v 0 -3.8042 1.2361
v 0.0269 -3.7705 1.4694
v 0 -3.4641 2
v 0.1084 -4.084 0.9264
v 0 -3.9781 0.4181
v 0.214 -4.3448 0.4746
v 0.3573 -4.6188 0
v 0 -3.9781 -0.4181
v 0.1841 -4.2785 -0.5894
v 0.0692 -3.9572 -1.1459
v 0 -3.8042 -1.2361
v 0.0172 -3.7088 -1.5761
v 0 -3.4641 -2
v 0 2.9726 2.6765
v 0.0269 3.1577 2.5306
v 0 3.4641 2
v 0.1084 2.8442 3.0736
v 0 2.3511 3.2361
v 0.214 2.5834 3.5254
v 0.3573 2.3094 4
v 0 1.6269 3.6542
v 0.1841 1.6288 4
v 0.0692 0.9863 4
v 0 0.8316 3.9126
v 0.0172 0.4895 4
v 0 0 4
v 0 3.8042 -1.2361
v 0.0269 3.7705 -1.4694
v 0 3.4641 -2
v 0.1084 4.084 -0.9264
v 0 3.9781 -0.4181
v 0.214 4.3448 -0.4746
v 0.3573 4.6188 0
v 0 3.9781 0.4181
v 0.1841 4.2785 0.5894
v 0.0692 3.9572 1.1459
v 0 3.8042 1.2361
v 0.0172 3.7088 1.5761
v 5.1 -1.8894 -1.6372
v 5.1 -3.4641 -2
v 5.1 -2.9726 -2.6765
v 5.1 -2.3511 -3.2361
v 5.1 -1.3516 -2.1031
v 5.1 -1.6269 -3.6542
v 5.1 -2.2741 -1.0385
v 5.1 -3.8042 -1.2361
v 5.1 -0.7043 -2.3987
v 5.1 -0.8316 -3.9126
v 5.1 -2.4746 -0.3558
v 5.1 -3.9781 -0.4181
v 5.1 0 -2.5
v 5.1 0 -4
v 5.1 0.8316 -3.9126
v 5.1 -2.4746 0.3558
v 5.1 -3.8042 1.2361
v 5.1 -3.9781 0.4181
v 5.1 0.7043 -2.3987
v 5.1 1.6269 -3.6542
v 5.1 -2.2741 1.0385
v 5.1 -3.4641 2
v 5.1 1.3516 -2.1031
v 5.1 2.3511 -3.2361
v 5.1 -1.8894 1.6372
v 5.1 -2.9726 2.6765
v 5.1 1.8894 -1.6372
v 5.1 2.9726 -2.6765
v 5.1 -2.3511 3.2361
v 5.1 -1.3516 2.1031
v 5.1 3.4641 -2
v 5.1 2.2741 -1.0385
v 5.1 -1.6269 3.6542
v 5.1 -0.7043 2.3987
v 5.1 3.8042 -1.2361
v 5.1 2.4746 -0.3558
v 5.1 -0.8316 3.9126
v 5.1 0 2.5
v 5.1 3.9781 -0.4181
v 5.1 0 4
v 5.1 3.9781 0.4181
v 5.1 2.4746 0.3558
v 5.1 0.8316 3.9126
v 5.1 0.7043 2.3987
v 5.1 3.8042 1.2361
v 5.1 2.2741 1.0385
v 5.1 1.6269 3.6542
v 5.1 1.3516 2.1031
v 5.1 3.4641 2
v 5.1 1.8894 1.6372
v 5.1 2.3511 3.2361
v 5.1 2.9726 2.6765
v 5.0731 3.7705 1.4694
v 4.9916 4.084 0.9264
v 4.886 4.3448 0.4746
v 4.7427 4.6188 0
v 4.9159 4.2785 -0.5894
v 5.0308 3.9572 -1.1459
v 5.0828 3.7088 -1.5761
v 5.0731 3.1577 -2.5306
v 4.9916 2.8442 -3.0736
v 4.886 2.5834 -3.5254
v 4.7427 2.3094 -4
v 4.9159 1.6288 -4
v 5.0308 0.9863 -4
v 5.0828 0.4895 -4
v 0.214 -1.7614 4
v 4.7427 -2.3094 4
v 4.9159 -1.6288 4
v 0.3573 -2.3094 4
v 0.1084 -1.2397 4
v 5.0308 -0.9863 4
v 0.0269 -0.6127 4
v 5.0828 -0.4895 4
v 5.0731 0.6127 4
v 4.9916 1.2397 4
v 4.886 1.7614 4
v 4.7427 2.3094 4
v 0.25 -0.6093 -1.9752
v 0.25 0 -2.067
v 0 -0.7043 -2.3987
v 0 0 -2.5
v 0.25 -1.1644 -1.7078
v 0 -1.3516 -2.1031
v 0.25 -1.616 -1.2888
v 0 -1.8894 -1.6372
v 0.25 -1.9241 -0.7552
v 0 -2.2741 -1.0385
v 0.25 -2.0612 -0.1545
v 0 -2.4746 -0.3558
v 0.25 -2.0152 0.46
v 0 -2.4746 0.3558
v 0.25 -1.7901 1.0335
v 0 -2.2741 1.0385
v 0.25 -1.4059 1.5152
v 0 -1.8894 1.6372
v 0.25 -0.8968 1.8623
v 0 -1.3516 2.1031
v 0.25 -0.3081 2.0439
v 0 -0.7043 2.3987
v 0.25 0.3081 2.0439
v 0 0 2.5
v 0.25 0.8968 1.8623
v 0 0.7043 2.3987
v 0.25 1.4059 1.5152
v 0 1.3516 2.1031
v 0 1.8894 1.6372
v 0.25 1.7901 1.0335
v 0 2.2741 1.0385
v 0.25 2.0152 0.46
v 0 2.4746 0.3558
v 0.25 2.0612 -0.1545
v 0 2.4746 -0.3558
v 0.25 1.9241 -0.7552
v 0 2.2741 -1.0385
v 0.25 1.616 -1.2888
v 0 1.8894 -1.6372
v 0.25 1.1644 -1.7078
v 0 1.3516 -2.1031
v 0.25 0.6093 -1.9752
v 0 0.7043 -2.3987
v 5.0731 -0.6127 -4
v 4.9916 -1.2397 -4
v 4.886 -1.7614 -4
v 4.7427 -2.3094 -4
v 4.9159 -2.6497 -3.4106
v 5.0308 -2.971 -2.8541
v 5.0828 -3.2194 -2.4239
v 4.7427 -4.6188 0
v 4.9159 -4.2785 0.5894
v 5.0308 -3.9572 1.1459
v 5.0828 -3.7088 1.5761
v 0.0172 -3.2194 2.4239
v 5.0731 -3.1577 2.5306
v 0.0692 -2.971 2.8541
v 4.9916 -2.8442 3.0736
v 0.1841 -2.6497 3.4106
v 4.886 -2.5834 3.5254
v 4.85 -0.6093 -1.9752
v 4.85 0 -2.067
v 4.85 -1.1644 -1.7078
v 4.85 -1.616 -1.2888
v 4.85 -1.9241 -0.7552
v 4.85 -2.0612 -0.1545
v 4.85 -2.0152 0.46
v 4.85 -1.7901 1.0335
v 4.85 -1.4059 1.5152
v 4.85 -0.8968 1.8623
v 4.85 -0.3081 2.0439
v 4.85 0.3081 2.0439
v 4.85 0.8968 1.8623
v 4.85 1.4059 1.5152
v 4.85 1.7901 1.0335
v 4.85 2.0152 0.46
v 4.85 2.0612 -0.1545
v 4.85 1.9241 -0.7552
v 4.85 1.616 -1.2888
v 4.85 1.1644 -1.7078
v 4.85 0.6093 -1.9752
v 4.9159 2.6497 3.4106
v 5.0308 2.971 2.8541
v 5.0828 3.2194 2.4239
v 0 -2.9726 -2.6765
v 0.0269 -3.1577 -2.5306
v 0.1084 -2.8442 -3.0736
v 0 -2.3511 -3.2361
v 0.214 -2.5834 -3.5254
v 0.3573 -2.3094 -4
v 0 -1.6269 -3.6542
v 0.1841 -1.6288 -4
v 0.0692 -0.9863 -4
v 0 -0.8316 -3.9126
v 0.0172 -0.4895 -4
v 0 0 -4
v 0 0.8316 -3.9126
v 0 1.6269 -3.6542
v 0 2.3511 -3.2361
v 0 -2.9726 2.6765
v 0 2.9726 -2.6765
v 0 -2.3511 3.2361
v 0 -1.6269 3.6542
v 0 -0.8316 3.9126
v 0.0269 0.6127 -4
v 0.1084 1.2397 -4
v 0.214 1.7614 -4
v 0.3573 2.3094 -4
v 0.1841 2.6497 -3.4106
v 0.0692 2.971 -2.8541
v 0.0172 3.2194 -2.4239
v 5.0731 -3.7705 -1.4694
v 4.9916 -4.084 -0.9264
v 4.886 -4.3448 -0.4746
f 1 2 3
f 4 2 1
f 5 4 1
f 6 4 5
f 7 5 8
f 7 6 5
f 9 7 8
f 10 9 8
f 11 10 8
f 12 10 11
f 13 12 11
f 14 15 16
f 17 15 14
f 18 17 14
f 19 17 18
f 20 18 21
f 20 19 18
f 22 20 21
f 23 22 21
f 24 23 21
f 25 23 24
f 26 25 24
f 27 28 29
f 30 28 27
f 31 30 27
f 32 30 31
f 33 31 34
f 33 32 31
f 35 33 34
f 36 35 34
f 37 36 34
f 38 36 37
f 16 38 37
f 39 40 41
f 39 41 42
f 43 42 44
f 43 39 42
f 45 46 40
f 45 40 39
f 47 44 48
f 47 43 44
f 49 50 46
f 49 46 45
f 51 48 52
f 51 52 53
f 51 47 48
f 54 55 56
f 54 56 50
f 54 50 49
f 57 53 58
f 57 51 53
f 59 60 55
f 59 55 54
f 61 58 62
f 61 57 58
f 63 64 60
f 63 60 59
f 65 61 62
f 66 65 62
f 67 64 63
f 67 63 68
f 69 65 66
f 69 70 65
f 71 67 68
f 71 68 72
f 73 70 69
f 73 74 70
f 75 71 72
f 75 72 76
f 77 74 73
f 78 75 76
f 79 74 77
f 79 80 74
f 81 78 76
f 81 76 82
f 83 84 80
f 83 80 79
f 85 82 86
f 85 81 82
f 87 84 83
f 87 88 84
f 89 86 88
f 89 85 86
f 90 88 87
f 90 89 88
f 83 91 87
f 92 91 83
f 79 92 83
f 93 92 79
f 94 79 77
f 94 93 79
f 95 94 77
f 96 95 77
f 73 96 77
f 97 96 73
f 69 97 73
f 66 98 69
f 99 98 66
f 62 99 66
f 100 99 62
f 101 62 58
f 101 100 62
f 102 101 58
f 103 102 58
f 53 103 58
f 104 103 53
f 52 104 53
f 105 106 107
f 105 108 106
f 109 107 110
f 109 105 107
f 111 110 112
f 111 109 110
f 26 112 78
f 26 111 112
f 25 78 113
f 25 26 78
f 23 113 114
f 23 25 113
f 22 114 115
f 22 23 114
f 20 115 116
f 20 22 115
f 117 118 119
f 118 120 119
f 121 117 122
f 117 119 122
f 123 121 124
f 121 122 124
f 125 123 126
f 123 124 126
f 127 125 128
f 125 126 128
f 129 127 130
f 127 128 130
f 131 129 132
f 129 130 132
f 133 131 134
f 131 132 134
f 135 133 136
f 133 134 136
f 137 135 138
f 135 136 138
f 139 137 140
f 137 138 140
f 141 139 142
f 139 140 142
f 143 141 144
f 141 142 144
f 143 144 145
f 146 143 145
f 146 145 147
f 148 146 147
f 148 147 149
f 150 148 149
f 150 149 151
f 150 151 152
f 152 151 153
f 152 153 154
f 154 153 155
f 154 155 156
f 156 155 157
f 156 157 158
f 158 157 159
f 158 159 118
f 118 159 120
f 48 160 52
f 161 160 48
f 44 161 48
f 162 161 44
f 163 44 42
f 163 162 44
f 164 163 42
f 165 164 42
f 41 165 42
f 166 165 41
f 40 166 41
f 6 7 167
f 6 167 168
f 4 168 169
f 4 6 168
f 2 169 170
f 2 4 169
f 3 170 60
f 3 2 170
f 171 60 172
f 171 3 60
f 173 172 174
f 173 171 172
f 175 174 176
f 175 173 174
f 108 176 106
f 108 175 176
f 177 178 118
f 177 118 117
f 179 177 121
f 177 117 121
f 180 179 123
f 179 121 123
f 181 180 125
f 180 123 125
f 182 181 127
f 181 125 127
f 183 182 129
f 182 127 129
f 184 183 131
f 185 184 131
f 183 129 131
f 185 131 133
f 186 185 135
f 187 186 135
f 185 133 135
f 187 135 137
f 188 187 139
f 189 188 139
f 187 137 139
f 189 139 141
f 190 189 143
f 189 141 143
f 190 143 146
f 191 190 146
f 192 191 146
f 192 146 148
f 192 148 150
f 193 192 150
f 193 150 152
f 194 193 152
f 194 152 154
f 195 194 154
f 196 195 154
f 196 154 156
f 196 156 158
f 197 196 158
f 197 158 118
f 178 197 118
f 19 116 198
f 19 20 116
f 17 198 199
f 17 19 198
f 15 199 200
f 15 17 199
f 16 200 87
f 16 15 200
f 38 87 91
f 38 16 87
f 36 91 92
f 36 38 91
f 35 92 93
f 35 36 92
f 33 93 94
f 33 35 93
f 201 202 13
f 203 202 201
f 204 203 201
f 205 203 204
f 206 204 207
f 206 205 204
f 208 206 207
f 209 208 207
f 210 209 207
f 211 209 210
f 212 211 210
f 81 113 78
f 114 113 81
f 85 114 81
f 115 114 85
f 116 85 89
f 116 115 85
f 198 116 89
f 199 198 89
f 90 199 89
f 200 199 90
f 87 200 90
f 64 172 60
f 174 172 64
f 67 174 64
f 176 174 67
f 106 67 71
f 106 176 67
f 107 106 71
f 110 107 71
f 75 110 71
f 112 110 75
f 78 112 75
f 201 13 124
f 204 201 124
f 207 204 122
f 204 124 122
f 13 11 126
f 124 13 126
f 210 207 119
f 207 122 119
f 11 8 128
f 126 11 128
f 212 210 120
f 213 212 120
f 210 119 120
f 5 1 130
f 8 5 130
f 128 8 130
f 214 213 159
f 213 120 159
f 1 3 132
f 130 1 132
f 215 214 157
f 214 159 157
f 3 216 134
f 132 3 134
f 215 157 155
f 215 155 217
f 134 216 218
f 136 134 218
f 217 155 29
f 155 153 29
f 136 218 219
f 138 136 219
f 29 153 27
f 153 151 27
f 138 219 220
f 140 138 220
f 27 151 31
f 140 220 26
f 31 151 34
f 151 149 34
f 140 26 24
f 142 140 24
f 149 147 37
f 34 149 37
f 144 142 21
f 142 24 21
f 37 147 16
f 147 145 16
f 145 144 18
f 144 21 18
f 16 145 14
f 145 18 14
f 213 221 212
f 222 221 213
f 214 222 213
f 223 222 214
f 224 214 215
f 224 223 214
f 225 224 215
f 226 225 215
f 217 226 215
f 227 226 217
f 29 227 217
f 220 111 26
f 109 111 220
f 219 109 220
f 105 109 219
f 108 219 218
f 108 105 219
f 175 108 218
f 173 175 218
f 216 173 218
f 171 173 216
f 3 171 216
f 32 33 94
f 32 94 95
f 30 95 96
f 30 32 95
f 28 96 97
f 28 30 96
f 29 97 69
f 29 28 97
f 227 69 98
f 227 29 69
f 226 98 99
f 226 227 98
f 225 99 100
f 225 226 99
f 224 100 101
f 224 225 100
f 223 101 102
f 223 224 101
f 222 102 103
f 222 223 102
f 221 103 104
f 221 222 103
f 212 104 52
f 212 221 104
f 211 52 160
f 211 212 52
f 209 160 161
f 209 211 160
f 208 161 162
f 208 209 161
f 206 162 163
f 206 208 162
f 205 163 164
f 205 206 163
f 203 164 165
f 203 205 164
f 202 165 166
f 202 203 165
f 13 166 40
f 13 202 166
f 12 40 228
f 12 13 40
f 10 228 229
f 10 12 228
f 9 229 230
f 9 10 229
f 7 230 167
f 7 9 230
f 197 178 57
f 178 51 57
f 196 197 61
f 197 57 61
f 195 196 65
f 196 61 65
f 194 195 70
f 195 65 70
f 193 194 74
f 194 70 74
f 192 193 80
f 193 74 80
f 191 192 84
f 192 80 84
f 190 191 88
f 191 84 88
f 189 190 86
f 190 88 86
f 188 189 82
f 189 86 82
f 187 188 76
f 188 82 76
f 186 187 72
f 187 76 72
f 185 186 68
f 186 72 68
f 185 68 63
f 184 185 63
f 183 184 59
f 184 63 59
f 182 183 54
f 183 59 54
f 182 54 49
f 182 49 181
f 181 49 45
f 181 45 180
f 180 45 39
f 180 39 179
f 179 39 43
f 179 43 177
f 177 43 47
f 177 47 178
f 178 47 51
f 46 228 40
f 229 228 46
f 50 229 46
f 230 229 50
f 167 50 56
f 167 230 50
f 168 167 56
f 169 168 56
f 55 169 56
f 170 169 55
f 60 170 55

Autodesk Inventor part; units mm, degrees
ref_plane "YZ Plane" through (0, 0, 0) normal (1, 0, 0) x (0, 1, 0)
ref_plane "XZ Plane" through (0, 0, 0) normal (0, 1, 0) x (-1, 0, 0)
sketch "Sketch1" plane through (0, 0, 0) normal (1, 0, 0) x (0, 1, 0)
  line L0 (-4.6188, 0) -> (-2.3094, 4)
  line L1 (-2.3094, 4) -> (2.3094, 4)
  line L2 (2.3094, 4) -> (4.6188, 0)
  line L3 (4.6188, 0) -> (2.3094, -4)
  line L4 (2.3094, -4) -> (-2.3094, -4)
  line L5 (-2.3094, -4) -> (-4.6188, 0)
  point P0 (0, 0)
  point P1 (0, 0)
  dimension "d0" = 9.2376
extrude "Body" add sketch "Sketch1" along normal blind 5.1
sketch "Sketch2" plane through (0, 0, 0) normal (0, 0, 1) x (1, 0, 0)
  line L0 (0, 2.3094) -> (0, 4.6188) projected
  line L1 (0, 4.6188) -> (5.1, 4.6188) projected
  line L2 (5.1, 2.3094) -> (5.1, 4.6188) projected
  line L3 (-1.02, 0) -> (6.12, 0) projected
  line L4 (0.3573, 4.6188) -> (0, 4)
  line L5 (4.7427, 4.6188) -> (5.1, 4)
  dimension "d3" = 30
  dimension "d4" = 30
  dimension "d5" = 8
  dimension "d6" = 8
revolve "Chamfer1" cut sketch "Sketch2" angle 360 about axis through (-10, 0, 0) along (1, 0, 0)
sketch "Sketch3" plane through (5.1, 0, 0) normal (1, 0, 0) x (0, 0, -1)
  arc A0 (-2, -3.4641) -> (2, -3.4641) centre (0, 0) ccw projected
hole "Thread" at (5.1, 0, 0) direction (-1, 0, 0) diameter 4.134 end through all thread size "M5x0.8" class "6H" standard "ANSI Metric M Profile"
chamfer "Chamfer2" distance 0.433 angle 30 1 edges at (5.1, 0, 2.067) measured on face at (5.1, 3.336, -0.083)
chamfer "Chamfer3" distance 0.433 angle 30 1 edges at (0, 0, 2.067) measured on face at (0, 3.336, -0.083)
ref_plane "Work Plane1" through (-8.1417, 0, 0) normal (0, -0.866, -0.5) x (1, 0, 0)
equation "\"d0\" = 1.1547 * SW"
equation "\"d1\" = KOH"
equation "\"d3\" = ANG1"
equation "\"d4\" = ANG2"
equation "\"d5\" = SW0"
equation "\"d6\" = SW01"
equation "\"d8\" = -0.5 * GD1 + 0.5 * NND"
equation "\"d40\" = -0.5 * GD1 + 0.5 * NND"
equation "\"d10\" = -0.5 * GD1 + 0.5 * NND"
equation "\"d41\" = -0.5 * GD1 + 0.5 * NND"
equation "\"ANG1\" = 30deg"
equation "\"ANG2\" = 30deg"
equation "\"NND\" = 5"
equation "\"KOH\" = 5.1"
equation "\"SW\" = 8"
equation "\"SW0\" = SW"
equation "\"SW01\" = SW"
equation "\"GUL\" = 0.541266 * PTC"
equation "\"THREADDIA\" = 5"
equation "\"TOA\" = 30deg"
equation "\"PTC\" = 0.8"
equation "\"E0\" = 1.155 * SW"
equation "\"GAL\" = 0.541266 * PTC"
equation "\"SD2\" = 0"
equation "\"WFT\" = 0"
equation "\"GD1\" = 4.133975"
properties part number "ANSI B18.2.4.2M - M5 x 0.8" material "Steel, Mild"
